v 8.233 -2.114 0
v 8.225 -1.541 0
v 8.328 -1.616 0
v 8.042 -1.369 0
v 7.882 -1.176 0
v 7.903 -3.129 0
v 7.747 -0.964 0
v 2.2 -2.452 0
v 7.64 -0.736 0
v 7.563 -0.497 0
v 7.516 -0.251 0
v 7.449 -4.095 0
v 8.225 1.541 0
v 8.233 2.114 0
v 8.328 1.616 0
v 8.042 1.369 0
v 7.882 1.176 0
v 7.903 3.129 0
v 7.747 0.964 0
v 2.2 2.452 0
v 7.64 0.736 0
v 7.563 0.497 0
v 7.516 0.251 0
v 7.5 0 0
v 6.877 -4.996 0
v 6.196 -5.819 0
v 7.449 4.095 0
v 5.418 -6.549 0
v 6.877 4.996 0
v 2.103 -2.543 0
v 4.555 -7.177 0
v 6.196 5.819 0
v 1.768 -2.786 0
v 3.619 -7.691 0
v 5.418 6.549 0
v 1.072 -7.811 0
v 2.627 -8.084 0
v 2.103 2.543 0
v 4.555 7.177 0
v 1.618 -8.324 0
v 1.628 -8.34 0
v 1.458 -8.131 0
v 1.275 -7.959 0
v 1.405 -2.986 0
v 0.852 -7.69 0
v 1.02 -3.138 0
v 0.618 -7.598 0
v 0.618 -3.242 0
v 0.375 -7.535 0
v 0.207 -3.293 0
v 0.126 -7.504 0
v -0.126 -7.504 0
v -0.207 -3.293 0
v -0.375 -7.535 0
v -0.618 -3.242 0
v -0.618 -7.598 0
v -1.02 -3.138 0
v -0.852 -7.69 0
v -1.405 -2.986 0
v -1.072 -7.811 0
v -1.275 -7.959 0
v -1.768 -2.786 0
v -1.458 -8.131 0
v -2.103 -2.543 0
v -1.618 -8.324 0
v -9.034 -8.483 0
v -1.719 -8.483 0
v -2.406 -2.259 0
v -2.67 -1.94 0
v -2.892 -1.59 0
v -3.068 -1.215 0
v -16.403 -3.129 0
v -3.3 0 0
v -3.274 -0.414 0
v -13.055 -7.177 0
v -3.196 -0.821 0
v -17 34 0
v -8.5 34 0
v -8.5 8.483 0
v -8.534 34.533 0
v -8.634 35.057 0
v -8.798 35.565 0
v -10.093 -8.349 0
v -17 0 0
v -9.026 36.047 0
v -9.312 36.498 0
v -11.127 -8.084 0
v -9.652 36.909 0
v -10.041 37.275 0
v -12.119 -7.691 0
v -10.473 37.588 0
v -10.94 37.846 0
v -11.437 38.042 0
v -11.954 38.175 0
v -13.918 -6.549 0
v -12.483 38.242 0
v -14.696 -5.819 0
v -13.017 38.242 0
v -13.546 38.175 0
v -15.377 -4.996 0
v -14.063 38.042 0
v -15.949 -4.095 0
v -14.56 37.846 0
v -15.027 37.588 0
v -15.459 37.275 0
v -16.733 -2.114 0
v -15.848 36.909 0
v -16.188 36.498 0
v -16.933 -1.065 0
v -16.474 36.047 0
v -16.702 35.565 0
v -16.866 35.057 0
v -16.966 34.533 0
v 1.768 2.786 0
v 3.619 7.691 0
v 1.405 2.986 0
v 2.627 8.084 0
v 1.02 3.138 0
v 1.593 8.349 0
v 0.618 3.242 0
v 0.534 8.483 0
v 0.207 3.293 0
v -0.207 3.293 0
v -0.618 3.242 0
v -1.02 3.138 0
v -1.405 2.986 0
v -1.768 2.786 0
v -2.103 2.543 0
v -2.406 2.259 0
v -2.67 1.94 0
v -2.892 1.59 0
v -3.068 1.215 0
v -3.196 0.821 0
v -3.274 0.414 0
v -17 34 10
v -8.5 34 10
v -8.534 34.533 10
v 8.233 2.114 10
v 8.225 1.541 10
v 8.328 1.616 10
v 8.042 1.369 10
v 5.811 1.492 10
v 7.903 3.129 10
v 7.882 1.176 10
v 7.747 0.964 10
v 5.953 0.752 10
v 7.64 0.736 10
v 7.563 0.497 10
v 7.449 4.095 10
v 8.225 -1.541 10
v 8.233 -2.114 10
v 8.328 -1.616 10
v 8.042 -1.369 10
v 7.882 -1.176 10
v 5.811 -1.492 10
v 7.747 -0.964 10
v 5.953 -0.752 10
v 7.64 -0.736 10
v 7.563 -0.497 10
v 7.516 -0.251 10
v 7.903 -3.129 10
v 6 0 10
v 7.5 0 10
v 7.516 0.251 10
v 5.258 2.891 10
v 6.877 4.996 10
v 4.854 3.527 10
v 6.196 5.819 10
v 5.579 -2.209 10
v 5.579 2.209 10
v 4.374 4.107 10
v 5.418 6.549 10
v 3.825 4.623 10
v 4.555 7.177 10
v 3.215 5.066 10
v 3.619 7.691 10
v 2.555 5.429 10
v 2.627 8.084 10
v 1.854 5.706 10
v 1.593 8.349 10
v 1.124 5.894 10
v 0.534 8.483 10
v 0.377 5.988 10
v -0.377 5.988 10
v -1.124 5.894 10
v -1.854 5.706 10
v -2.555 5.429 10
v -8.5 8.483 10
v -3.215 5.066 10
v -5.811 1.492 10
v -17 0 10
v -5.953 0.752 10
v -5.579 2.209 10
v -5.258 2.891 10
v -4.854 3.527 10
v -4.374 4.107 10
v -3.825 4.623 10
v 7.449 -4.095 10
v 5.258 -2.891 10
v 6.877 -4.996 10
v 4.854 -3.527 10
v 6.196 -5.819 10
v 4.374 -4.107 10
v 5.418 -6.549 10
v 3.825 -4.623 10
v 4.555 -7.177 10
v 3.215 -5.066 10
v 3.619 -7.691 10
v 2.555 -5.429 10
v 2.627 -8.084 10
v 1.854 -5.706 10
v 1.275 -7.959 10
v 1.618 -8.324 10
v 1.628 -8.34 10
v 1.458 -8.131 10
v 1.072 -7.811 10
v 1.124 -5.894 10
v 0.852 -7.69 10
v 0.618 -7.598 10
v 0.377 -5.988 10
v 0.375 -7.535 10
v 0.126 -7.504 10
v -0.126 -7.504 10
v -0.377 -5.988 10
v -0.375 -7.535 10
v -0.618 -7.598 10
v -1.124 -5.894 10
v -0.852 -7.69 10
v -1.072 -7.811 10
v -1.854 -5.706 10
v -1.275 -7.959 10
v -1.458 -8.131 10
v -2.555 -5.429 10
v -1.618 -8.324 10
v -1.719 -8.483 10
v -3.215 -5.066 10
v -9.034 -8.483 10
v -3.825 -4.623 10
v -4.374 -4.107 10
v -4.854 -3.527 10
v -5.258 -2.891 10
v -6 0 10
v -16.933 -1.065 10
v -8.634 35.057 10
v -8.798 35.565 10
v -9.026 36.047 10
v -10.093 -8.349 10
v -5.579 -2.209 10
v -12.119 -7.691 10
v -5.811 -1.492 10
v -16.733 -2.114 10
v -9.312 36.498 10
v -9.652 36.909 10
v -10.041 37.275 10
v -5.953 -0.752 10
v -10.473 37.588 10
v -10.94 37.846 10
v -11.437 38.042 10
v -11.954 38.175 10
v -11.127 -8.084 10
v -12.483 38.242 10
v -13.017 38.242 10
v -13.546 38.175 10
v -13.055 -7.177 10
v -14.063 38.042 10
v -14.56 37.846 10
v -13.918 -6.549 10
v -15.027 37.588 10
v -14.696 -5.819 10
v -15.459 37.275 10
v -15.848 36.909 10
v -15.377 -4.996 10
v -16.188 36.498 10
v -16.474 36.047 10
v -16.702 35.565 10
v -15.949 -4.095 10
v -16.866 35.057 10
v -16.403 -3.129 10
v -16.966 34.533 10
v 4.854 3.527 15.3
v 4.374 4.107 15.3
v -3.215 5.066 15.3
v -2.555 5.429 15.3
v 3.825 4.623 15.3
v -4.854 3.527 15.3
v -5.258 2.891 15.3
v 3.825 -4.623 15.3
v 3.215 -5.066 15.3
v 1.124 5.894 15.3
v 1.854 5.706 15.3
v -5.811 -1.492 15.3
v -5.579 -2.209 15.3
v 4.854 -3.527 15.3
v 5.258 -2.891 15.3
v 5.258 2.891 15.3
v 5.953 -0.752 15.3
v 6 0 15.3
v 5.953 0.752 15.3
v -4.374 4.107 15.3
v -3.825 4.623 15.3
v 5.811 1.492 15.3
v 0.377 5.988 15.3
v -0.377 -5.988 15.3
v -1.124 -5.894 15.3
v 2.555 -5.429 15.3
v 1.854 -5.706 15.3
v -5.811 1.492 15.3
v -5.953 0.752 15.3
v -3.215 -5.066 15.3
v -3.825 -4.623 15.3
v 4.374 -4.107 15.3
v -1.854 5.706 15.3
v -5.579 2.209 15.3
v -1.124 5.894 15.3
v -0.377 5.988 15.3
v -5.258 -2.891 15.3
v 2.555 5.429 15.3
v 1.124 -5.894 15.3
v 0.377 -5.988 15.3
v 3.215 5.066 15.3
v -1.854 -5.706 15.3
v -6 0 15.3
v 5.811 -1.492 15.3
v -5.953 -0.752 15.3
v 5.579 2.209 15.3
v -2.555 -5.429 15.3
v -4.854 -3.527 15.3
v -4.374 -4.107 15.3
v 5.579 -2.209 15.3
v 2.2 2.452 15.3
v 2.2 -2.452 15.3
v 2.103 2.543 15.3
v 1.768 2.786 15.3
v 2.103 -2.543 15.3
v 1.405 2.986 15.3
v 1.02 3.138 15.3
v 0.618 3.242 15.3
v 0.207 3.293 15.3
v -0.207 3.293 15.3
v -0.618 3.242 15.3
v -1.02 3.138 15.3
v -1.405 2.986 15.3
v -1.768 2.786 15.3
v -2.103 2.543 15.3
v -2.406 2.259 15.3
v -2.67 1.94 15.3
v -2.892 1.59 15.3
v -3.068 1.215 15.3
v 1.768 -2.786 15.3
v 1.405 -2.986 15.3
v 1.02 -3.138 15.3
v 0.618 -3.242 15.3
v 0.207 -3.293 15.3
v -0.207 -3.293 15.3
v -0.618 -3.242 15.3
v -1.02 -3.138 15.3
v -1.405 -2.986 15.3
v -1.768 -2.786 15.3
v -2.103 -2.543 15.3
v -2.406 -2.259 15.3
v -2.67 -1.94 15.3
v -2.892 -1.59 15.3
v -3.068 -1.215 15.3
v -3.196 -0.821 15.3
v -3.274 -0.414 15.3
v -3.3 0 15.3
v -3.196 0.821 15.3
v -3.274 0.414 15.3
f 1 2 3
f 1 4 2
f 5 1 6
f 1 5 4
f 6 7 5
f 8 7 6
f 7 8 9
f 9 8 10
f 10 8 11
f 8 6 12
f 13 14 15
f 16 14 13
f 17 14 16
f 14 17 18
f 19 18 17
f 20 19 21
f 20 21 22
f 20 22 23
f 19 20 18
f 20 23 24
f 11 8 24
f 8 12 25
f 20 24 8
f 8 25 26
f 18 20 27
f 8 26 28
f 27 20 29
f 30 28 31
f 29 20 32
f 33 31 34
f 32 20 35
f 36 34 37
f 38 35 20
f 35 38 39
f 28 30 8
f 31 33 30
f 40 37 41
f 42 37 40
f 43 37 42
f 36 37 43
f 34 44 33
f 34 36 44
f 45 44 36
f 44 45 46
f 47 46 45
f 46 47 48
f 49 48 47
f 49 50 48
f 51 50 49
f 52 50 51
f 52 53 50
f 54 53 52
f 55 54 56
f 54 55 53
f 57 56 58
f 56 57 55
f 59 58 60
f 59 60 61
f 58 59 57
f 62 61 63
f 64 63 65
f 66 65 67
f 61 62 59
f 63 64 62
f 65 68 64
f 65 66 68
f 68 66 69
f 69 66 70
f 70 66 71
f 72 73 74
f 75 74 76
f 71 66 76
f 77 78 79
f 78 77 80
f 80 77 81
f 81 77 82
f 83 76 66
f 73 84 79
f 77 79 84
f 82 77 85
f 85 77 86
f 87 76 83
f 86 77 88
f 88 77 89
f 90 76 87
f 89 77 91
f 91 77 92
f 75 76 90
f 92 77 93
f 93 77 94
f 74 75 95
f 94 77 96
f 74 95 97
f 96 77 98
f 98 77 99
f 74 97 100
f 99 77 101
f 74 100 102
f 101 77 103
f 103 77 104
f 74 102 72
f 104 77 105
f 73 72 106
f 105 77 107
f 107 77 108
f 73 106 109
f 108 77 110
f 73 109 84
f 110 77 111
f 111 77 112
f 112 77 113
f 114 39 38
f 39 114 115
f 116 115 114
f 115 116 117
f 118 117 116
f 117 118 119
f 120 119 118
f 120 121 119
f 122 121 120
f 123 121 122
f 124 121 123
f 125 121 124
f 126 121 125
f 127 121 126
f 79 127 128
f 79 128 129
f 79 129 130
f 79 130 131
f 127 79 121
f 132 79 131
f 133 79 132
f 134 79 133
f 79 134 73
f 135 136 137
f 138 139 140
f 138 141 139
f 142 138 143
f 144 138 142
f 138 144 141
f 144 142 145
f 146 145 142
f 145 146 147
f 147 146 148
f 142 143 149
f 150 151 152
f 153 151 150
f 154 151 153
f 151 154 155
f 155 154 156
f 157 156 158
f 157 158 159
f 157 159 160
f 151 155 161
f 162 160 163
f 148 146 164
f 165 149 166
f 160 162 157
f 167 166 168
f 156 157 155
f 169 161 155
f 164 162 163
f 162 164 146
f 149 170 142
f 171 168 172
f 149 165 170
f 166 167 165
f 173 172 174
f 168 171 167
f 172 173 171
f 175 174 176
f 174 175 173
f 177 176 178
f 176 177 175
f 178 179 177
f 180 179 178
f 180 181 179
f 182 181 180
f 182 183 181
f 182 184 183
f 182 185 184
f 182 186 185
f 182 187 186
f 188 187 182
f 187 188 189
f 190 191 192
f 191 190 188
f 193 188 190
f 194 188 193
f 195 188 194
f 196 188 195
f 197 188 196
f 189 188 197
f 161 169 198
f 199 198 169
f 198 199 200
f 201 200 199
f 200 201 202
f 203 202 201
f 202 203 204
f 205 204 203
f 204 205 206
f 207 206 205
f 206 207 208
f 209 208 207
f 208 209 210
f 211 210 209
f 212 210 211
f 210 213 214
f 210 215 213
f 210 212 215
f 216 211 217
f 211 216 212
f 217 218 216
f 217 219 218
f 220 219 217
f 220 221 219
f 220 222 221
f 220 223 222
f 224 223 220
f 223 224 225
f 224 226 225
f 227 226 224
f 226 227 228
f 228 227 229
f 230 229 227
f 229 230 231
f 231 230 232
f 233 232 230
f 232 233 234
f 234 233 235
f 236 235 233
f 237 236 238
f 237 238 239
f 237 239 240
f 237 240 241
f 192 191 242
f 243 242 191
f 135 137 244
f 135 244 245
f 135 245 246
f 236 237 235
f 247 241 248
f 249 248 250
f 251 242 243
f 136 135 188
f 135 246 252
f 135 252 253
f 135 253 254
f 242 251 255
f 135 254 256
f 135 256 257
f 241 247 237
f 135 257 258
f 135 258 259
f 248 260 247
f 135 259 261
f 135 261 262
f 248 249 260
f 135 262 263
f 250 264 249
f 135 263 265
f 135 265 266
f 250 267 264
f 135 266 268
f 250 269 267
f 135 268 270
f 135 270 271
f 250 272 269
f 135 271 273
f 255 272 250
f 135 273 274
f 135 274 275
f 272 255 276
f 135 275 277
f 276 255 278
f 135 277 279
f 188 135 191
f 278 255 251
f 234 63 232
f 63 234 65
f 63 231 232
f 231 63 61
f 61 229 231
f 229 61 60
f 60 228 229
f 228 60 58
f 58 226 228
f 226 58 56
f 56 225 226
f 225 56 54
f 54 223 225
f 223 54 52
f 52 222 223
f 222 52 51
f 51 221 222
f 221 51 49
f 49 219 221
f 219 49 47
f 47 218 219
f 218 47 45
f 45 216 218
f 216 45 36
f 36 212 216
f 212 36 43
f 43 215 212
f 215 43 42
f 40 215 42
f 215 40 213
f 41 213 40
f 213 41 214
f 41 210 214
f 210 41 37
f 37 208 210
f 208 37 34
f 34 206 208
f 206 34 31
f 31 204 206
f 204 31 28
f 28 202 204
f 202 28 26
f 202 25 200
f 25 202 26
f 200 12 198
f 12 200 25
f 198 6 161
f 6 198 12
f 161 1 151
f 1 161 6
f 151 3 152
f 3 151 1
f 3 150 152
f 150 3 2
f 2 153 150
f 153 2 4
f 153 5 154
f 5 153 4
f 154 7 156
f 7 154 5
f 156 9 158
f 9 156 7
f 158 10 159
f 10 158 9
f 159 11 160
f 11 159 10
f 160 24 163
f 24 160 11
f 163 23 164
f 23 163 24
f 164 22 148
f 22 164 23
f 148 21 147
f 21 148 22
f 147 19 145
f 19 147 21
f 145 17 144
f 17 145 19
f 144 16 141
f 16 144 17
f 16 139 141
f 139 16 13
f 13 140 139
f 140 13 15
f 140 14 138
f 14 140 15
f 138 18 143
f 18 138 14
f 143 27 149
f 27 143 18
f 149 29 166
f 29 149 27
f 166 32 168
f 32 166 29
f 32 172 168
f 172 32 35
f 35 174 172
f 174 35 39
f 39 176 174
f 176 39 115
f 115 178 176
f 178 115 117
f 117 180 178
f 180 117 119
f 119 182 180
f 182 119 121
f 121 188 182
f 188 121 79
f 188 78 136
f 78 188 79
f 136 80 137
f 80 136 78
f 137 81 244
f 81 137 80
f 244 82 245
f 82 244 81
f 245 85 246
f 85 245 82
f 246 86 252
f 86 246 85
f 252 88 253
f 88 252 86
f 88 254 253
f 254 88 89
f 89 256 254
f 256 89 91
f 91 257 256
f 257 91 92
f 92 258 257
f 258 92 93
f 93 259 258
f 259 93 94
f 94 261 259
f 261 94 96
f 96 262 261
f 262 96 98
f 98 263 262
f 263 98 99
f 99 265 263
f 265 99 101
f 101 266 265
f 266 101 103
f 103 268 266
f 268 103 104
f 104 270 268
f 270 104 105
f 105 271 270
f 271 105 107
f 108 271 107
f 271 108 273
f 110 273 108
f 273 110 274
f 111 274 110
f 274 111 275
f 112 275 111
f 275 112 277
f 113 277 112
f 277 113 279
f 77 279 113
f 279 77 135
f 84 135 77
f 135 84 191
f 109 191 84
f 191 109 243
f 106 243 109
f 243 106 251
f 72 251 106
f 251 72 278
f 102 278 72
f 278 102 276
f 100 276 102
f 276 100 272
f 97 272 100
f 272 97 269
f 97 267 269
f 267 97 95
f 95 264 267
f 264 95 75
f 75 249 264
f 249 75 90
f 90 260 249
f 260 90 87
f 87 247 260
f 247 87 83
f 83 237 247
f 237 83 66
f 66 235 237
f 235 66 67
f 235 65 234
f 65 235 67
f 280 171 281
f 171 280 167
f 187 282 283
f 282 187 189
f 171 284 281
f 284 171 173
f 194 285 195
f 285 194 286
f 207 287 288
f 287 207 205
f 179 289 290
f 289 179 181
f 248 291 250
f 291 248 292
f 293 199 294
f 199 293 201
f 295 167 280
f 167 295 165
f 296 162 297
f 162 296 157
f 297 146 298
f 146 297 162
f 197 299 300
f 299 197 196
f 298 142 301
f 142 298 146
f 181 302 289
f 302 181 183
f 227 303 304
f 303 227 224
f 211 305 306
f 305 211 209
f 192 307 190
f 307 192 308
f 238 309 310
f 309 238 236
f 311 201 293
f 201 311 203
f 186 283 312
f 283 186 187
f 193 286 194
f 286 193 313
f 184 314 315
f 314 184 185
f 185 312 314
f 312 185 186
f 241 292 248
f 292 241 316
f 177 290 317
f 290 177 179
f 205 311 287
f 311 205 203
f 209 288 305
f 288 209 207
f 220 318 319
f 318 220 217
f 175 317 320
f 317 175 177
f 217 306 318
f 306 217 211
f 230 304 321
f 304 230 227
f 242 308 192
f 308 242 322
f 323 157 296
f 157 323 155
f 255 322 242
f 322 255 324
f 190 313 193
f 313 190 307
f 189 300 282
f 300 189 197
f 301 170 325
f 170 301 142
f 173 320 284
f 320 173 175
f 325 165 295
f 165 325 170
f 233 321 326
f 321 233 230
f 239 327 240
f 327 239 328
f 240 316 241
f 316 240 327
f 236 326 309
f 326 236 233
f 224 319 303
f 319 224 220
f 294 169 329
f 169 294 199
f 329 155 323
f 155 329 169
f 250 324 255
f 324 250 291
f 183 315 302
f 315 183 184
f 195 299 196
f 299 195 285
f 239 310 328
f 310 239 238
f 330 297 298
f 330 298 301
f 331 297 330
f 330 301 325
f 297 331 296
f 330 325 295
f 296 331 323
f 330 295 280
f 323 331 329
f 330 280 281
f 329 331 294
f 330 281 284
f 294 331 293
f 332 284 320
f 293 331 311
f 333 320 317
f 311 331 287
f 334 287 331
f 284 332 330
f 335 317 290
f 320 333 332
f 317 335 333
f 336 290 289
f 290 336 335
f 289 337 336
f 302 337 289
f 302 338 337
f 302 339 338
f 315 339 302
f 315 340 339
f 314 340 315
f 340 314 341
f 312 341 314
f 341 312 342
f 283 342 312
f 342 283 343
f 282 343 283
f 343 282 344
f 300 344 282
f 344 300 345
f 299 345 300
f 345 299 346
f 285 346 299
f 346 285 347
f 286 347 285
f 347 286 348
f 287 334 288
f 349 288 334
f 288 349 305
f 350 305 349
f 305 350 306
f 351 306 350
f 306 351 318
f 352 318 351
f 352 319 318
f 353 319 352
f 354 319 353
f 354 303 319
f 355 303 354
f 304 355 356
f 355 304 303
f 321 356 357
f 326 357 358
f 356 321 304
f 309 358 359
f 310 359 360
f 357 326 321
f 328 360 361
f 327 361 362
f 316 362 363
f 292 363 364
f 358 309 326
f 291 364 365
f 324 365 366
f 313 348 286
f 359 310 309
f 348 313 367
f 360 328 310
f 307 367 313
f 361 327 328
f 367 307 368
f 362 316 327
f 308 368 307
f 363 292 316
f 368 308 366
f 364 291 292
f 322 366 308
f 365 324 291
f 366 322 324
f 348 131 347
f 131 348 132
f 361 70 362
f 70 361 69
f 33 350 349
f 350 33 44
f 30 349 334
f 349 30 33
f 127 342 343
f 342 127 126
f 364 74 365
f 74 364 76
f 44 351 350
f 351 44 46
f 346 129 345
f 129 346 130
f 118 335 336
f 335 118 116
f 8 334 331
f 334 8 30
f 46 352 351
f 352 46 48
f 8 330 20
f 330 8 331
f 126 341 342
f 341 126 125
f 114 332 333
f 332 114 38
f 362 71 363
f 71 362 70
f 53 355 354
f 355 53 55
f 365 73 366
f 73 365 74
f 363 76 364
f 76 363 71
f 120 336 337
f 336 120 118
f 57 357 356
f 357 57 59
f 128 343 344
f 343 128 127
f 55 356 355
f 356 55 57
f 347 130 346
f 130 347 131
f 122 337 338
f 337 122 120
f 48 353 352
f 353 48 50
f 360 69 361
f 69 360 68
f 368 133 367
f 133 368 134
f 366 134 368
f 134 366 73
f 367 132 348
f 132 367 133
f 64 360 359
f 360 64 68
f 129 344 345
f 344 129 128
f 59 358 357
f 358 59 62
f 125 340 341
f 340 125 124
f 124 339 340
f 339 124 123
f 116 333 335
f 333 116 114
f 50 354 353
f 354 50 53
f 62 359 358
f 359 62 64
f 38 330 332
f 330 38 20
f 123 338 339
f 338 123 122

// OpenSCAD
/****************************************************************************
 *   Open-Source Whole Home Water Shutoff System                            *
 *   Copyright 2021 Marcio Teixeira                                         *
 *                                                                          *
 *   This program is free software: you can redistribute it and/or modify   *
 *   it under the terms of the GNU General Public License as published by   *
 *   the Free Software Foundation, either version 3 of the License, or      *
 *   (at your option) any later version.                                    *
 *                                                                          *
 *   This program is distributed in the hope that it will be useful,        *
 *   but WITHOUT ANY WARRANTY; without even the implied warranty of         *
 *   MERCHANTABILITY or FITNESS FOR A PARTICULAR PURPOSE.  See the          *
 *   GNU General Public License for more details.                           *
 *                                                                          *
 *   To view a copy of the GNU General Public License, go to the following  *
 *   location: <http://www.gnu.org/licenses/>.                              *
 ****************************************************************************/
 
$fn              = 50;
slack            = 0.3;

axle_dia         = 6;
axle_notch_dia   = 5.50;
axle_notch_depth = axle_dia - axle_notch_dia;

handle_width     = 17;
mount_hole_dia   = 15;
mount_thickness  = 4 + 3.3;
pusher_thickness = 10;

part_depth       = pusher_thickness + mount_thickness - 2;
wall_thickness   = handle_width/2;

module axle_profile() {
    d = axle_dia + slack*2;
    n = axle_notch_depth + slack;
    difference() {
        circle(d=d);
        translate([axle_dia-n,0])
            square([axle_dia,axle_dia], center=true);
    }
}

module axle() {
    linear_extrude(100,center=true)
        axle_profile();
}

module pusher_dents() {
    r = handle_width/2+1;
    for(a=[0,-90])
        translate([r*cos(a),r*sin(a)])
            circle(d=4);    
}

module pusher_profile() {
    mirror([1,0]) {
        hull() {
            circle(d=handle_width);
            translate([handle_width/2,0])
                circle(d=handle_width);
        }
        translate([handle_width/2+wall_thickness/2,0,0])
            hull() {
                circle(d=wall_thickness);
                translate([0, handle_width*2,0])
                    circle(d=wall_thickness);
            }
    }
}

module pusher_shaft() {
    cylinder(d=mount_hole_dia - 3, h=part_depth);
}

module pusher() {
    difference() {
        union() {
            linear_extrude(pusher_thickness)
                difference() {
                    pusher_profile();
                    pusher_dents();
                }
            pusher_shaft();
        }
        #axle();
    }
}

module pusher2() {
    translate([0,-part_depth+mount_thickness,0])
        rotate([90,0,180])
            #pusher();
}

pusher();
